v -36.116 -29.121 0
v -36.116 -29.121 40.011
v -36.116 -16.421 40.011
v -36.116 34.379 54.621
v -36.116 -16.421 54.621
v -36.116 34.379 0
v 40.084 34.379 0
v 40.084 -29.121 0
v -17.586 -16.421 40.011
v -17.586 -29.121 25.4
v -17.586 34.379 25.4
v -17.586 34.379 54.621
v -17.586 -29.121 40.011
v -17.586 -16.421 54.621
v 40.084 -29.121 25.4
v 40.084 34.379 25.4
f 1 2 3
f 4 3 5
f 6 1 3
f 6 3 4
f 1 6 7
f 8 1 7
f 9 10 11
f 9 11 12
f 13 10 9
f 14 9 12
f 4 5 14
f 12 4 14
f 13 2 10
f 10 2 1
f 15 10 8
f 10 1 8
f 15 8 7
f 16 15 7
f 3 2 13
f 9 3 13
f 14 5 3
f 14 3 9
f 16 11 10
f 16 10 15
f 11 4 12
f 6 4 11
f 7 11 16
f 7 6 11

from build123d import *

# Parameters (mm, degrees)
F0_W     = 76.2
F0_H     = 63.5
F1_DEPTH = 25.4
F2_W     = 18.529646
F2_H     = 29.221089
F3_DEPTH = 63.5
F4_W     = 18.529646
F4_H     = 14.610544
F5_DEPTH = 12.7


with BuildPart() as f1:
    # F0 (on Top) → F1 (new body)
    with BuildSketch(Plane.XY):
        with Locations((1.98446, 2.628666)):
            Rectangle(F0_W, F0_H)
    extrude(amount=F1_DEPTH)

    # F2 (on face) → F3 (join)
    with BuildSketch(Plane.XZ.offset(29.121334)):
        with Locations((-26.850717, 40.010544)):
            Rectangle(F2_W, F2_H)
    extrude(amount=-F3_DEPTH)

    # F4 (on face) → F5 (cut)
    with BuildSketch(Plane.XZ.offset(29.121334)):
        with Locations((-26.850717, 47.315817)):
            Rectangle(F4_W, F4_H)
    extrude(amount=-F5_DEPTH, mode=Mode.SUBTRACT)


solid = f1.part
